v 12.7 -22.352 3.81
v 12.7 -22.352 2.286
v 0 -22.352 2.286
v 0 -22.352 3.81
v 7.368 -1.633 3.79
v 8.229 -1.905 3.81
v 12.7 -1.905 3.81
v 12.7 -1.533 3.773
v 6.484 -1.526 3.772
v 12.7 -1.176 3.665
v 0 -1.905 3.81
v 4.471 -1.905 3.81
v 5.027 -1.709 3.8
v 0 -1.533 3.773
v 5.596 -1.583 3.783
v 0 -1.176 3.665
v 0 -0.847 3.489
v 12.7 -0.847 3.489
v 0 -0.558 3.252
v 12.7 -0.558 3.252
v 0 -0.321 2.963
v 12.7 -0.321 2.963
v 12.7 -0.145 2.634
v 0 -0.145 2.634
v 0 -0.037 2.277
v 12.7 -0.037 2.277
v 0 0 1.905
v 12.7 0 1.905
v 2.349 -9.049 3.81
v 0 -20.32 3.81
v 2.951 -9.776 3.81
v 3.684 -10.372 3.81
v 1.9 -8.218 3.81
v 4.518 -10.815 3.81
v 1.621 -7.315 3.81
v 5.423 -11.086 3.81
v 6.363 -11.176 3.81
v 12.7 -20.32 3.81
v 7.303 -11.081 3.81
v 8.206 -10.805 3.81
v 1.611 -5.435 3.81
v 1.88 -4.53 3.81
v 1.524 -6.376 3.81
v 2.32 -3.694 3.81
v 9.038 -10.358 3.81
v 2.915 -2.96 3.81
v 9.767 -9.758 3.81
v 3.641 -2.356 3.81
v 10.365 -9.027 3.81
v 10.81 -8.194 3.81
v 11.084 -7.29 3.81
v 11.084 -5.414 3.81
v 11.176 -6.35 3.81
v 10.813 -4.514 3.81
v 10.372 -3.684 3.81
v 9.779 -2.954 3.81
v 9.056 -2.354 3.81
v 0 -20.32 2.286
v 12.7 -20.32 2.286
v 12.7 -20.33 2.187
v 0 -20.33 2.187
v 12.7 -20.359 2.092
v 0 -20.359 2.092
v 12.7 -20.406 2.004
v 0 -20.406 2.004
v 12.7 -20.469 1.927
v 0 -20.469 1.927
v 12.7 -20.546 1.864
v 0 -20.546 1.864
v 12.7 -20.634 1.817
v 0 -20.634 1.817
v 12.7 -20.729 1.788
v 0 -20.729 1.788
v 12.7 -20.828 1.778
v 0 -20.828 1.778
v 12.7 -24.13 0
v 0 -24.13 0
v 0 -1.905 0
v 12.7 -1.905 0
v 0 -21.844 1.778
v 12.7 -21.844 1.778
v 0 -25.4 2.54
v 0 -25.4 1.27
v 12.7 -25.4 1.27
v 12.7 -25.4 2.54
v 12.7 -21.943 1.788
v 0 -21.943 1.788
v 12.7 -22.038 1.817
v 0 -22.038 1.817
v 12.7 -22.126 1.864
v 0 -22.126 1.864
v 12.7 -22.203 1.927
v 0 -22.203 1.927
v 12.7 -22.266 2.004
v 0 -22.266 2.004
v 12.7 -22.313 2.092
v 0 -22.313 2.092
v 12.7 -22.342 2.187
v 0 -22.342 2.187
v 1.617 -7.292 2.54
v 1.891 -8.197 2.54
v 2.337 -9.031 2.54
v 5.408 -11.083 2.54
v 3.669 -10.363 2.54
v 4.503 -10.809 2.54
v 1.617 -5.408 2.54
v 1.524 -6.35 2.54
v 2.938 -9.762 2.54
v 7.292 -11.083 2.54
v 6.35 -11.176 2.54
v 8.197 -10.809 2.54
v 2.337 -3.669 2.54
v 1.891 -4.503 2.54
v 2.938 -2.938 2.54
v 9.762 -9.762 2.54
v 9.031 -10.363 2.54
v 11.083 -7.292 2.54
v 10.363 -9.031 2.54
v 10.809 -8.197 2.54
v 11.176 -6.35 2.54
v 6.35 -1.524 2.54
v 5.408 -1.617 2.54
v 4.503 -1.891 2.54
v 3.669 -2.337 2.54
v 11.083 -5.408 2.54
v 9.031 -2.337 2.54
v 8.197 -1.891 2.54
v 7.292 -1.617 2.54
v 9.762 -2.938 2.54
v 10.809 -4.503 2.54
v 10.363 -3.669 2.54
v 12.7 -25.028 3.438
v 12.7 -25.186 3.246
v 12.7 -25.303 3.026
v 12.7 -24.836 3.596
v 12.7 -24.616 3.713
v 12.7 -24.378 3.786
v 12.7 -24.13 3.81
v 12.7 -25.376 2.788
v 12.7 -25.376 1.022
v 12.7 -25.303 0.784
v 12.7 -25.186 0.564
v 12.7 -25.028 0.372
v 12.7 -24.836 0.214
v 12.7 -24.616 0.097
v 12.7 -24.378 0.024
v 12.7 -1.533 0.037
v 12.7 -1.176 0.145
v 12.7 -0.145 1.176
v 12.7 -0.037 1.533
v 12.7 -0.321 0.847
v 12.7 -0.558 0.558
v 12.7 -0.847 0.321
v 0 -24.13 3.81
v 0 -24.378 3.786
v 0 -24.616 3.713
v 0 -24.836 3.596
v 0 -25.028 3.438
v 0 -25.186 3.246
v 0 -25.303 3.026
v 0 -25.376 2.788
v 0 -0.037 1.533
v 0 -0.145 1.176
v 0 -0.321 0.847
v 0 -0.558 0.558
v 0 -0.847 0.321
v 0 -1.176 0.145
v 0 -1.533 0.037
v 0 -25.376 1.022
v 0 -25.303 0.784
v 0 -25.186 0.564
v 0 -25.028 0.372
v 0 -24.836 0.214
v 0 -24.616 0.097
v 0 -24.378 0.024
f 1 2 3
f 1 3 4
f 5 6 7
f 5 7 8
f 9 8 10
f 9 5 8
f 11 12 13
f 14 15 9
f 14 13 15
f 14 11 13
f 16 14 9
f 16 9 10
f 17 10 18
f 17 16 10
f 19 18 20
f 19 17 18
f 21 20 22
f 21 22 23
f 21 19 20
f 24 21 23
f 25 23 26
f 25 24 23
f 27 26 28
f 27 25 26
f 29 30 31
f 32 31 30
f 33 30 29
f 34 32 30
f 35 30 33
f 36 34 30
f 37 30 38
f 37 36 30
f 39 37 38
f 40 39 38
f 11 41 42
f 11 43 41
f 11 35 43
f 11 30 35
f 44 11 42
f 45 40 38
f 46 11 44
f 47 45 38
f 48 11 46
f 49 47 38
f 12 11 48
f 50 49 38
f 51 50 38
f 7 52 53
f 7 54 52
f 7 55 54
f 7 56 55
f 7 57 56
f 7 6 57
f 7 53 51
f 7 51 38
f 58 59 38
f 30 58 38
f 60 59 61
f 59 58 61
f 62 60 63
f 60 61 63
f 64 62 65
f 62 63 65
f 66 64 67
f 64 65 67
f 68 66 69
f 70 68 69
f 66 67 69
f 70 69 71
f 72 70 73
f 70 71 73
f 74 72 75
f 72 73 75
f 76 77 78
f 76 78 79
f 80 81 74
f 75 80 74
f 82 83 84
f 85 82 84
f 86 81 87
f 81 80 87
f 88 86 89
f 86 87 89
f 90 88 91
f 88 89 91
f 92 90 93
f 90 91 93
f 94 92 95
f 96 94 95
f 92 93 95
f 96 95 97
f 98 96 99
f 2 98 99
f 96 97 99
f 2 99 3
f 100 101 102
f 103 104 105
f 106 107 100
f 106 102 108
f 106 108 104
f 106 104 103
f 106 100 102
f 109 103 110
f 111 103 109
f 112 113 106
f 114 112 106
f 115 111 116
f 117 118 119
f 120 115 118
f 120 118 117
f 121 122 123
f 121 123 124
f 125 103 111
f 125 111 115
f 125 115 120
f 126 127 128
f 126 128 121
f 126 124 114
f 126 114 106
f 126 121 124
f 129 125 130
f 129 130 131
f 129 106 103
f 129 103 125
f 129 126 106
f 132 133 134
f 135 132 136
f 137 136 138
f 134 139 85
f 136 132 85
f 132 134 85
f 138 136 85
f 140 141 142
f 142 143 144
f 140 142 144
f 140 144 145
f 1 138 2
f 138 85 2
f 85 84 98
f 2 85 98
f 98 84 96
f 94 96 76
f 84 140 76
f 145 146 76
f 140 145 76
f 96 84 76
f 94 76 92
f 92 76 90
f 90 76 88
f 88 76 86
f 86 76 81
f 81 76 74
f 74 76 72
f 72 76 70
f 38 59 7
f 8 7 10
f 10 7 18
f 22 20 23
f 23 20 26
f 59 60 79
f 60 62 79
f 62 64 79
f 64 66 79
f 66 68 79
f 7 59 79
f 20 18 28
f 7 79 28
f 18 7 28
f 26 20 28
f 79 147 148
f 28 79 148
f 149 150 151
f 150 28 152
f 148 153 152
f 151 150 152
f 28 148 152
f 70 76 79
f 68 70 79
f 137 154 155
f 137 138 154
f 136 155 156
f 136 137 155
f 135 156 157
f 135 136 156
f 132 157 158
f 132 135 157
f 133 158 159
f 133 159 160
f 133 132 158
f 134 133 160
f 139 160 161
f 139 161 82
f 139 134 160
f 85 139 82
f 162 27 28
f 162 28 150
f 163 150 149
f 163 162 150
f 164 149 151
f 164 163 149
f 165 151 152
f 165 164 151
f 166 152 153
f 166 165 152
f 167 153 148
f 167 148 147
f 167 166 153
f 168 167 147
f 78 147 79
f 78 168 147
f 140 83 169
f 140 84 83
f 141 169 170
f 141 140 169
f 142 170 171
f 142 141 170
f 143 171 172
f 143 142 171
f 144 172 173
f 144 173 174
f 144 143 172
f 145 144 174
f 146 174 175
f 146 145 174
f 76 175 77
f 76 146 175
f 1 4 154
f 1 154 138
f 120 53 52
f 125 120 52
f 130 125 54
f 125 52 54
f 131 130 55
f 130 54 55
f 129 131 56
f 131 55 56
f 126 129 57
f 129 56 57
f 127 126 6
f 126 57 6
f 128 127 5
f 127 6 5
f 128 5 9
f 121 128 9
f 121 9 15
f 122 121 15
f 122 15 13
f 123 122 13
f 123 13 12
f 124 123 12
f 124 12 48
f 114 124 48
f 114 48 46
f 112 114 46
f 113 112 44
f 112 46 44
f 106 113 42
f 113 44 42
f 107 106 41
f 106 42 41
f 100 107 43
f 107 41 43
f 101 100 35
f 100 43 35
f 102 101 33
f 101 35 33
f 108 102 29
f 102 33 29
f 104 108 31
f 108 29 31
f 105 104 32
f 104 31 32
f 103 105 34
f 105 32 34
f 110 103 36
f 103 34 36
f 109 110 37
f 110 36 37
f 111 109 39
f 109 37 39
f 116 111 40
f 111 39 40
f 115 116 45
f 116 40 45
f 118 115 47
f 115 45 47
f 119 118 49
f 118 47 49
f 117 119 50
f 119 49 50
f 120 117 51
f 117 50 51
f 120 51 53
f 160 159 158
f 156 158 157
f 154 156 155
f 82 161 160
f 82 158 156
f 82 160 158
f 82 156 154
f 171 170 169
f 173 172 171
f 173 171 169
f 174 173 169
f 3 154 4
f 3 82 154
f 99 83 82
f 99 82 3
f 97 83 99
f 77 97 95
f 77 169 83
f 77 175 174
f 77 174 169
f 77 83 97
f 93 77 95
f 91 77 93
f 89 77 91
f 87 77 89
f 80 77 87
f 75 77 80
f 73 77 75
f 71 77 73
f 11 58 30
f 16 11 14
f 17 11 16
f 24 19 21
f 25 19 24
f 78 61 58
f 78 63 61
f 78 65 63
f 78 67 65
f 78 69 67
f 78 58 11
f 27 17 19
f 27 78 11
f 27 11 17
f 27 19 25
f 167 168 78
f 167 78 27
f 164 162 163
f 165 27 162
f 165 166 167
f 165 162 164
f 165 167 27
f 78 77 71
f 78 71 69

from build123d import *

# Parameters (mm, degrees)
F0_W        = 12.7
F0_H        = 25.4
F1_DEPTH    = 3.81
F2_R        = 4.826
F3_DEPTH    = 1.27
F4_W        = 2.032
F4_H        = 2.032
F5_DEPTH    = 25.4
F6_R        = 0.508
F7_T1_DEPTH = 22.225
F8_R        = 1.27


# Not quite as in the source:
# - a fillet or chamfer that OpenCascade refuses, or shapes differently, is made with other operations: its cross-section is extruded or revolved along the edge and cut away or added


with BuildPart() as f1:
    # F0 (on Top) → F1 (new body)
    with BuildSketch(Plane.XY):
        with Locations((6.35, -12.7)):
            Rectangle(F0_W, F0_H)
    extrude(amount=F1_DEPTH)

    # F2 (on face) → F3 (cut)
    with BuildSketch(Plane.XY.offset(3.81)):
        with Locations((6.35, -6.35)):
            Circle(F2_R)
    extrude(amount=-F3_DEPTH, mode=Mode.SUBTRACT)

    # F4 (on face) → F5 (cut)
    with BuildSketch(Plane.YZ.offset(12.7)):
        with Locations((-21.336, 2.794)):
            Rectangle(F4_W, F4_H)
    extrude(amount=-F5_DEPTH, mode=Mode.SUBTRACT)

    # F6
    f6_edges = [f1.edges().sort_by_distance(p)[0] for p in [
        (6.35, -20.32, 1.778),
        (6.35, -22.352, 1.778),
    ]]
    fillet(f6_edges, radius=F6_R)

    # F7: fillet of radius 1.905 on 2 edges, made by hand

    # F7_s2 → F7_t1 (cut)
    with BuildSketch(Plane.YZ.offset(-4.7625)):
        with BuildLine():
            ThreePointArc((0, 1.905), (-0.5579615818, 0.5579615818), (-1.905, 0))
            Line((-1.905, 0), (0, 0))
            Line((0, 0), (0, 1.905))
        make_face()
        with BuildLine():
            ThreePointArc((-1.905, 3.81), (-0.5579615818, 3.2520384182), (0, 1.905))
            Line((0, 1.905), (0, 3.81))
            Line((0, 3.81), (-1.905, 3.81))
        make_face()
    extrude(amount=F7_T1_DEPTH, mode=Mode.SUBTRACT)

    # F8
    f8_edges = [f1.edges().sort_by_distance(p)[0] for p in [
        (6.35, -25.4, 3.81),
        (6.35, -25.4, 0),
    ]]
    fillet(f8_edges, radius=F8_R)


solid = f1.part
